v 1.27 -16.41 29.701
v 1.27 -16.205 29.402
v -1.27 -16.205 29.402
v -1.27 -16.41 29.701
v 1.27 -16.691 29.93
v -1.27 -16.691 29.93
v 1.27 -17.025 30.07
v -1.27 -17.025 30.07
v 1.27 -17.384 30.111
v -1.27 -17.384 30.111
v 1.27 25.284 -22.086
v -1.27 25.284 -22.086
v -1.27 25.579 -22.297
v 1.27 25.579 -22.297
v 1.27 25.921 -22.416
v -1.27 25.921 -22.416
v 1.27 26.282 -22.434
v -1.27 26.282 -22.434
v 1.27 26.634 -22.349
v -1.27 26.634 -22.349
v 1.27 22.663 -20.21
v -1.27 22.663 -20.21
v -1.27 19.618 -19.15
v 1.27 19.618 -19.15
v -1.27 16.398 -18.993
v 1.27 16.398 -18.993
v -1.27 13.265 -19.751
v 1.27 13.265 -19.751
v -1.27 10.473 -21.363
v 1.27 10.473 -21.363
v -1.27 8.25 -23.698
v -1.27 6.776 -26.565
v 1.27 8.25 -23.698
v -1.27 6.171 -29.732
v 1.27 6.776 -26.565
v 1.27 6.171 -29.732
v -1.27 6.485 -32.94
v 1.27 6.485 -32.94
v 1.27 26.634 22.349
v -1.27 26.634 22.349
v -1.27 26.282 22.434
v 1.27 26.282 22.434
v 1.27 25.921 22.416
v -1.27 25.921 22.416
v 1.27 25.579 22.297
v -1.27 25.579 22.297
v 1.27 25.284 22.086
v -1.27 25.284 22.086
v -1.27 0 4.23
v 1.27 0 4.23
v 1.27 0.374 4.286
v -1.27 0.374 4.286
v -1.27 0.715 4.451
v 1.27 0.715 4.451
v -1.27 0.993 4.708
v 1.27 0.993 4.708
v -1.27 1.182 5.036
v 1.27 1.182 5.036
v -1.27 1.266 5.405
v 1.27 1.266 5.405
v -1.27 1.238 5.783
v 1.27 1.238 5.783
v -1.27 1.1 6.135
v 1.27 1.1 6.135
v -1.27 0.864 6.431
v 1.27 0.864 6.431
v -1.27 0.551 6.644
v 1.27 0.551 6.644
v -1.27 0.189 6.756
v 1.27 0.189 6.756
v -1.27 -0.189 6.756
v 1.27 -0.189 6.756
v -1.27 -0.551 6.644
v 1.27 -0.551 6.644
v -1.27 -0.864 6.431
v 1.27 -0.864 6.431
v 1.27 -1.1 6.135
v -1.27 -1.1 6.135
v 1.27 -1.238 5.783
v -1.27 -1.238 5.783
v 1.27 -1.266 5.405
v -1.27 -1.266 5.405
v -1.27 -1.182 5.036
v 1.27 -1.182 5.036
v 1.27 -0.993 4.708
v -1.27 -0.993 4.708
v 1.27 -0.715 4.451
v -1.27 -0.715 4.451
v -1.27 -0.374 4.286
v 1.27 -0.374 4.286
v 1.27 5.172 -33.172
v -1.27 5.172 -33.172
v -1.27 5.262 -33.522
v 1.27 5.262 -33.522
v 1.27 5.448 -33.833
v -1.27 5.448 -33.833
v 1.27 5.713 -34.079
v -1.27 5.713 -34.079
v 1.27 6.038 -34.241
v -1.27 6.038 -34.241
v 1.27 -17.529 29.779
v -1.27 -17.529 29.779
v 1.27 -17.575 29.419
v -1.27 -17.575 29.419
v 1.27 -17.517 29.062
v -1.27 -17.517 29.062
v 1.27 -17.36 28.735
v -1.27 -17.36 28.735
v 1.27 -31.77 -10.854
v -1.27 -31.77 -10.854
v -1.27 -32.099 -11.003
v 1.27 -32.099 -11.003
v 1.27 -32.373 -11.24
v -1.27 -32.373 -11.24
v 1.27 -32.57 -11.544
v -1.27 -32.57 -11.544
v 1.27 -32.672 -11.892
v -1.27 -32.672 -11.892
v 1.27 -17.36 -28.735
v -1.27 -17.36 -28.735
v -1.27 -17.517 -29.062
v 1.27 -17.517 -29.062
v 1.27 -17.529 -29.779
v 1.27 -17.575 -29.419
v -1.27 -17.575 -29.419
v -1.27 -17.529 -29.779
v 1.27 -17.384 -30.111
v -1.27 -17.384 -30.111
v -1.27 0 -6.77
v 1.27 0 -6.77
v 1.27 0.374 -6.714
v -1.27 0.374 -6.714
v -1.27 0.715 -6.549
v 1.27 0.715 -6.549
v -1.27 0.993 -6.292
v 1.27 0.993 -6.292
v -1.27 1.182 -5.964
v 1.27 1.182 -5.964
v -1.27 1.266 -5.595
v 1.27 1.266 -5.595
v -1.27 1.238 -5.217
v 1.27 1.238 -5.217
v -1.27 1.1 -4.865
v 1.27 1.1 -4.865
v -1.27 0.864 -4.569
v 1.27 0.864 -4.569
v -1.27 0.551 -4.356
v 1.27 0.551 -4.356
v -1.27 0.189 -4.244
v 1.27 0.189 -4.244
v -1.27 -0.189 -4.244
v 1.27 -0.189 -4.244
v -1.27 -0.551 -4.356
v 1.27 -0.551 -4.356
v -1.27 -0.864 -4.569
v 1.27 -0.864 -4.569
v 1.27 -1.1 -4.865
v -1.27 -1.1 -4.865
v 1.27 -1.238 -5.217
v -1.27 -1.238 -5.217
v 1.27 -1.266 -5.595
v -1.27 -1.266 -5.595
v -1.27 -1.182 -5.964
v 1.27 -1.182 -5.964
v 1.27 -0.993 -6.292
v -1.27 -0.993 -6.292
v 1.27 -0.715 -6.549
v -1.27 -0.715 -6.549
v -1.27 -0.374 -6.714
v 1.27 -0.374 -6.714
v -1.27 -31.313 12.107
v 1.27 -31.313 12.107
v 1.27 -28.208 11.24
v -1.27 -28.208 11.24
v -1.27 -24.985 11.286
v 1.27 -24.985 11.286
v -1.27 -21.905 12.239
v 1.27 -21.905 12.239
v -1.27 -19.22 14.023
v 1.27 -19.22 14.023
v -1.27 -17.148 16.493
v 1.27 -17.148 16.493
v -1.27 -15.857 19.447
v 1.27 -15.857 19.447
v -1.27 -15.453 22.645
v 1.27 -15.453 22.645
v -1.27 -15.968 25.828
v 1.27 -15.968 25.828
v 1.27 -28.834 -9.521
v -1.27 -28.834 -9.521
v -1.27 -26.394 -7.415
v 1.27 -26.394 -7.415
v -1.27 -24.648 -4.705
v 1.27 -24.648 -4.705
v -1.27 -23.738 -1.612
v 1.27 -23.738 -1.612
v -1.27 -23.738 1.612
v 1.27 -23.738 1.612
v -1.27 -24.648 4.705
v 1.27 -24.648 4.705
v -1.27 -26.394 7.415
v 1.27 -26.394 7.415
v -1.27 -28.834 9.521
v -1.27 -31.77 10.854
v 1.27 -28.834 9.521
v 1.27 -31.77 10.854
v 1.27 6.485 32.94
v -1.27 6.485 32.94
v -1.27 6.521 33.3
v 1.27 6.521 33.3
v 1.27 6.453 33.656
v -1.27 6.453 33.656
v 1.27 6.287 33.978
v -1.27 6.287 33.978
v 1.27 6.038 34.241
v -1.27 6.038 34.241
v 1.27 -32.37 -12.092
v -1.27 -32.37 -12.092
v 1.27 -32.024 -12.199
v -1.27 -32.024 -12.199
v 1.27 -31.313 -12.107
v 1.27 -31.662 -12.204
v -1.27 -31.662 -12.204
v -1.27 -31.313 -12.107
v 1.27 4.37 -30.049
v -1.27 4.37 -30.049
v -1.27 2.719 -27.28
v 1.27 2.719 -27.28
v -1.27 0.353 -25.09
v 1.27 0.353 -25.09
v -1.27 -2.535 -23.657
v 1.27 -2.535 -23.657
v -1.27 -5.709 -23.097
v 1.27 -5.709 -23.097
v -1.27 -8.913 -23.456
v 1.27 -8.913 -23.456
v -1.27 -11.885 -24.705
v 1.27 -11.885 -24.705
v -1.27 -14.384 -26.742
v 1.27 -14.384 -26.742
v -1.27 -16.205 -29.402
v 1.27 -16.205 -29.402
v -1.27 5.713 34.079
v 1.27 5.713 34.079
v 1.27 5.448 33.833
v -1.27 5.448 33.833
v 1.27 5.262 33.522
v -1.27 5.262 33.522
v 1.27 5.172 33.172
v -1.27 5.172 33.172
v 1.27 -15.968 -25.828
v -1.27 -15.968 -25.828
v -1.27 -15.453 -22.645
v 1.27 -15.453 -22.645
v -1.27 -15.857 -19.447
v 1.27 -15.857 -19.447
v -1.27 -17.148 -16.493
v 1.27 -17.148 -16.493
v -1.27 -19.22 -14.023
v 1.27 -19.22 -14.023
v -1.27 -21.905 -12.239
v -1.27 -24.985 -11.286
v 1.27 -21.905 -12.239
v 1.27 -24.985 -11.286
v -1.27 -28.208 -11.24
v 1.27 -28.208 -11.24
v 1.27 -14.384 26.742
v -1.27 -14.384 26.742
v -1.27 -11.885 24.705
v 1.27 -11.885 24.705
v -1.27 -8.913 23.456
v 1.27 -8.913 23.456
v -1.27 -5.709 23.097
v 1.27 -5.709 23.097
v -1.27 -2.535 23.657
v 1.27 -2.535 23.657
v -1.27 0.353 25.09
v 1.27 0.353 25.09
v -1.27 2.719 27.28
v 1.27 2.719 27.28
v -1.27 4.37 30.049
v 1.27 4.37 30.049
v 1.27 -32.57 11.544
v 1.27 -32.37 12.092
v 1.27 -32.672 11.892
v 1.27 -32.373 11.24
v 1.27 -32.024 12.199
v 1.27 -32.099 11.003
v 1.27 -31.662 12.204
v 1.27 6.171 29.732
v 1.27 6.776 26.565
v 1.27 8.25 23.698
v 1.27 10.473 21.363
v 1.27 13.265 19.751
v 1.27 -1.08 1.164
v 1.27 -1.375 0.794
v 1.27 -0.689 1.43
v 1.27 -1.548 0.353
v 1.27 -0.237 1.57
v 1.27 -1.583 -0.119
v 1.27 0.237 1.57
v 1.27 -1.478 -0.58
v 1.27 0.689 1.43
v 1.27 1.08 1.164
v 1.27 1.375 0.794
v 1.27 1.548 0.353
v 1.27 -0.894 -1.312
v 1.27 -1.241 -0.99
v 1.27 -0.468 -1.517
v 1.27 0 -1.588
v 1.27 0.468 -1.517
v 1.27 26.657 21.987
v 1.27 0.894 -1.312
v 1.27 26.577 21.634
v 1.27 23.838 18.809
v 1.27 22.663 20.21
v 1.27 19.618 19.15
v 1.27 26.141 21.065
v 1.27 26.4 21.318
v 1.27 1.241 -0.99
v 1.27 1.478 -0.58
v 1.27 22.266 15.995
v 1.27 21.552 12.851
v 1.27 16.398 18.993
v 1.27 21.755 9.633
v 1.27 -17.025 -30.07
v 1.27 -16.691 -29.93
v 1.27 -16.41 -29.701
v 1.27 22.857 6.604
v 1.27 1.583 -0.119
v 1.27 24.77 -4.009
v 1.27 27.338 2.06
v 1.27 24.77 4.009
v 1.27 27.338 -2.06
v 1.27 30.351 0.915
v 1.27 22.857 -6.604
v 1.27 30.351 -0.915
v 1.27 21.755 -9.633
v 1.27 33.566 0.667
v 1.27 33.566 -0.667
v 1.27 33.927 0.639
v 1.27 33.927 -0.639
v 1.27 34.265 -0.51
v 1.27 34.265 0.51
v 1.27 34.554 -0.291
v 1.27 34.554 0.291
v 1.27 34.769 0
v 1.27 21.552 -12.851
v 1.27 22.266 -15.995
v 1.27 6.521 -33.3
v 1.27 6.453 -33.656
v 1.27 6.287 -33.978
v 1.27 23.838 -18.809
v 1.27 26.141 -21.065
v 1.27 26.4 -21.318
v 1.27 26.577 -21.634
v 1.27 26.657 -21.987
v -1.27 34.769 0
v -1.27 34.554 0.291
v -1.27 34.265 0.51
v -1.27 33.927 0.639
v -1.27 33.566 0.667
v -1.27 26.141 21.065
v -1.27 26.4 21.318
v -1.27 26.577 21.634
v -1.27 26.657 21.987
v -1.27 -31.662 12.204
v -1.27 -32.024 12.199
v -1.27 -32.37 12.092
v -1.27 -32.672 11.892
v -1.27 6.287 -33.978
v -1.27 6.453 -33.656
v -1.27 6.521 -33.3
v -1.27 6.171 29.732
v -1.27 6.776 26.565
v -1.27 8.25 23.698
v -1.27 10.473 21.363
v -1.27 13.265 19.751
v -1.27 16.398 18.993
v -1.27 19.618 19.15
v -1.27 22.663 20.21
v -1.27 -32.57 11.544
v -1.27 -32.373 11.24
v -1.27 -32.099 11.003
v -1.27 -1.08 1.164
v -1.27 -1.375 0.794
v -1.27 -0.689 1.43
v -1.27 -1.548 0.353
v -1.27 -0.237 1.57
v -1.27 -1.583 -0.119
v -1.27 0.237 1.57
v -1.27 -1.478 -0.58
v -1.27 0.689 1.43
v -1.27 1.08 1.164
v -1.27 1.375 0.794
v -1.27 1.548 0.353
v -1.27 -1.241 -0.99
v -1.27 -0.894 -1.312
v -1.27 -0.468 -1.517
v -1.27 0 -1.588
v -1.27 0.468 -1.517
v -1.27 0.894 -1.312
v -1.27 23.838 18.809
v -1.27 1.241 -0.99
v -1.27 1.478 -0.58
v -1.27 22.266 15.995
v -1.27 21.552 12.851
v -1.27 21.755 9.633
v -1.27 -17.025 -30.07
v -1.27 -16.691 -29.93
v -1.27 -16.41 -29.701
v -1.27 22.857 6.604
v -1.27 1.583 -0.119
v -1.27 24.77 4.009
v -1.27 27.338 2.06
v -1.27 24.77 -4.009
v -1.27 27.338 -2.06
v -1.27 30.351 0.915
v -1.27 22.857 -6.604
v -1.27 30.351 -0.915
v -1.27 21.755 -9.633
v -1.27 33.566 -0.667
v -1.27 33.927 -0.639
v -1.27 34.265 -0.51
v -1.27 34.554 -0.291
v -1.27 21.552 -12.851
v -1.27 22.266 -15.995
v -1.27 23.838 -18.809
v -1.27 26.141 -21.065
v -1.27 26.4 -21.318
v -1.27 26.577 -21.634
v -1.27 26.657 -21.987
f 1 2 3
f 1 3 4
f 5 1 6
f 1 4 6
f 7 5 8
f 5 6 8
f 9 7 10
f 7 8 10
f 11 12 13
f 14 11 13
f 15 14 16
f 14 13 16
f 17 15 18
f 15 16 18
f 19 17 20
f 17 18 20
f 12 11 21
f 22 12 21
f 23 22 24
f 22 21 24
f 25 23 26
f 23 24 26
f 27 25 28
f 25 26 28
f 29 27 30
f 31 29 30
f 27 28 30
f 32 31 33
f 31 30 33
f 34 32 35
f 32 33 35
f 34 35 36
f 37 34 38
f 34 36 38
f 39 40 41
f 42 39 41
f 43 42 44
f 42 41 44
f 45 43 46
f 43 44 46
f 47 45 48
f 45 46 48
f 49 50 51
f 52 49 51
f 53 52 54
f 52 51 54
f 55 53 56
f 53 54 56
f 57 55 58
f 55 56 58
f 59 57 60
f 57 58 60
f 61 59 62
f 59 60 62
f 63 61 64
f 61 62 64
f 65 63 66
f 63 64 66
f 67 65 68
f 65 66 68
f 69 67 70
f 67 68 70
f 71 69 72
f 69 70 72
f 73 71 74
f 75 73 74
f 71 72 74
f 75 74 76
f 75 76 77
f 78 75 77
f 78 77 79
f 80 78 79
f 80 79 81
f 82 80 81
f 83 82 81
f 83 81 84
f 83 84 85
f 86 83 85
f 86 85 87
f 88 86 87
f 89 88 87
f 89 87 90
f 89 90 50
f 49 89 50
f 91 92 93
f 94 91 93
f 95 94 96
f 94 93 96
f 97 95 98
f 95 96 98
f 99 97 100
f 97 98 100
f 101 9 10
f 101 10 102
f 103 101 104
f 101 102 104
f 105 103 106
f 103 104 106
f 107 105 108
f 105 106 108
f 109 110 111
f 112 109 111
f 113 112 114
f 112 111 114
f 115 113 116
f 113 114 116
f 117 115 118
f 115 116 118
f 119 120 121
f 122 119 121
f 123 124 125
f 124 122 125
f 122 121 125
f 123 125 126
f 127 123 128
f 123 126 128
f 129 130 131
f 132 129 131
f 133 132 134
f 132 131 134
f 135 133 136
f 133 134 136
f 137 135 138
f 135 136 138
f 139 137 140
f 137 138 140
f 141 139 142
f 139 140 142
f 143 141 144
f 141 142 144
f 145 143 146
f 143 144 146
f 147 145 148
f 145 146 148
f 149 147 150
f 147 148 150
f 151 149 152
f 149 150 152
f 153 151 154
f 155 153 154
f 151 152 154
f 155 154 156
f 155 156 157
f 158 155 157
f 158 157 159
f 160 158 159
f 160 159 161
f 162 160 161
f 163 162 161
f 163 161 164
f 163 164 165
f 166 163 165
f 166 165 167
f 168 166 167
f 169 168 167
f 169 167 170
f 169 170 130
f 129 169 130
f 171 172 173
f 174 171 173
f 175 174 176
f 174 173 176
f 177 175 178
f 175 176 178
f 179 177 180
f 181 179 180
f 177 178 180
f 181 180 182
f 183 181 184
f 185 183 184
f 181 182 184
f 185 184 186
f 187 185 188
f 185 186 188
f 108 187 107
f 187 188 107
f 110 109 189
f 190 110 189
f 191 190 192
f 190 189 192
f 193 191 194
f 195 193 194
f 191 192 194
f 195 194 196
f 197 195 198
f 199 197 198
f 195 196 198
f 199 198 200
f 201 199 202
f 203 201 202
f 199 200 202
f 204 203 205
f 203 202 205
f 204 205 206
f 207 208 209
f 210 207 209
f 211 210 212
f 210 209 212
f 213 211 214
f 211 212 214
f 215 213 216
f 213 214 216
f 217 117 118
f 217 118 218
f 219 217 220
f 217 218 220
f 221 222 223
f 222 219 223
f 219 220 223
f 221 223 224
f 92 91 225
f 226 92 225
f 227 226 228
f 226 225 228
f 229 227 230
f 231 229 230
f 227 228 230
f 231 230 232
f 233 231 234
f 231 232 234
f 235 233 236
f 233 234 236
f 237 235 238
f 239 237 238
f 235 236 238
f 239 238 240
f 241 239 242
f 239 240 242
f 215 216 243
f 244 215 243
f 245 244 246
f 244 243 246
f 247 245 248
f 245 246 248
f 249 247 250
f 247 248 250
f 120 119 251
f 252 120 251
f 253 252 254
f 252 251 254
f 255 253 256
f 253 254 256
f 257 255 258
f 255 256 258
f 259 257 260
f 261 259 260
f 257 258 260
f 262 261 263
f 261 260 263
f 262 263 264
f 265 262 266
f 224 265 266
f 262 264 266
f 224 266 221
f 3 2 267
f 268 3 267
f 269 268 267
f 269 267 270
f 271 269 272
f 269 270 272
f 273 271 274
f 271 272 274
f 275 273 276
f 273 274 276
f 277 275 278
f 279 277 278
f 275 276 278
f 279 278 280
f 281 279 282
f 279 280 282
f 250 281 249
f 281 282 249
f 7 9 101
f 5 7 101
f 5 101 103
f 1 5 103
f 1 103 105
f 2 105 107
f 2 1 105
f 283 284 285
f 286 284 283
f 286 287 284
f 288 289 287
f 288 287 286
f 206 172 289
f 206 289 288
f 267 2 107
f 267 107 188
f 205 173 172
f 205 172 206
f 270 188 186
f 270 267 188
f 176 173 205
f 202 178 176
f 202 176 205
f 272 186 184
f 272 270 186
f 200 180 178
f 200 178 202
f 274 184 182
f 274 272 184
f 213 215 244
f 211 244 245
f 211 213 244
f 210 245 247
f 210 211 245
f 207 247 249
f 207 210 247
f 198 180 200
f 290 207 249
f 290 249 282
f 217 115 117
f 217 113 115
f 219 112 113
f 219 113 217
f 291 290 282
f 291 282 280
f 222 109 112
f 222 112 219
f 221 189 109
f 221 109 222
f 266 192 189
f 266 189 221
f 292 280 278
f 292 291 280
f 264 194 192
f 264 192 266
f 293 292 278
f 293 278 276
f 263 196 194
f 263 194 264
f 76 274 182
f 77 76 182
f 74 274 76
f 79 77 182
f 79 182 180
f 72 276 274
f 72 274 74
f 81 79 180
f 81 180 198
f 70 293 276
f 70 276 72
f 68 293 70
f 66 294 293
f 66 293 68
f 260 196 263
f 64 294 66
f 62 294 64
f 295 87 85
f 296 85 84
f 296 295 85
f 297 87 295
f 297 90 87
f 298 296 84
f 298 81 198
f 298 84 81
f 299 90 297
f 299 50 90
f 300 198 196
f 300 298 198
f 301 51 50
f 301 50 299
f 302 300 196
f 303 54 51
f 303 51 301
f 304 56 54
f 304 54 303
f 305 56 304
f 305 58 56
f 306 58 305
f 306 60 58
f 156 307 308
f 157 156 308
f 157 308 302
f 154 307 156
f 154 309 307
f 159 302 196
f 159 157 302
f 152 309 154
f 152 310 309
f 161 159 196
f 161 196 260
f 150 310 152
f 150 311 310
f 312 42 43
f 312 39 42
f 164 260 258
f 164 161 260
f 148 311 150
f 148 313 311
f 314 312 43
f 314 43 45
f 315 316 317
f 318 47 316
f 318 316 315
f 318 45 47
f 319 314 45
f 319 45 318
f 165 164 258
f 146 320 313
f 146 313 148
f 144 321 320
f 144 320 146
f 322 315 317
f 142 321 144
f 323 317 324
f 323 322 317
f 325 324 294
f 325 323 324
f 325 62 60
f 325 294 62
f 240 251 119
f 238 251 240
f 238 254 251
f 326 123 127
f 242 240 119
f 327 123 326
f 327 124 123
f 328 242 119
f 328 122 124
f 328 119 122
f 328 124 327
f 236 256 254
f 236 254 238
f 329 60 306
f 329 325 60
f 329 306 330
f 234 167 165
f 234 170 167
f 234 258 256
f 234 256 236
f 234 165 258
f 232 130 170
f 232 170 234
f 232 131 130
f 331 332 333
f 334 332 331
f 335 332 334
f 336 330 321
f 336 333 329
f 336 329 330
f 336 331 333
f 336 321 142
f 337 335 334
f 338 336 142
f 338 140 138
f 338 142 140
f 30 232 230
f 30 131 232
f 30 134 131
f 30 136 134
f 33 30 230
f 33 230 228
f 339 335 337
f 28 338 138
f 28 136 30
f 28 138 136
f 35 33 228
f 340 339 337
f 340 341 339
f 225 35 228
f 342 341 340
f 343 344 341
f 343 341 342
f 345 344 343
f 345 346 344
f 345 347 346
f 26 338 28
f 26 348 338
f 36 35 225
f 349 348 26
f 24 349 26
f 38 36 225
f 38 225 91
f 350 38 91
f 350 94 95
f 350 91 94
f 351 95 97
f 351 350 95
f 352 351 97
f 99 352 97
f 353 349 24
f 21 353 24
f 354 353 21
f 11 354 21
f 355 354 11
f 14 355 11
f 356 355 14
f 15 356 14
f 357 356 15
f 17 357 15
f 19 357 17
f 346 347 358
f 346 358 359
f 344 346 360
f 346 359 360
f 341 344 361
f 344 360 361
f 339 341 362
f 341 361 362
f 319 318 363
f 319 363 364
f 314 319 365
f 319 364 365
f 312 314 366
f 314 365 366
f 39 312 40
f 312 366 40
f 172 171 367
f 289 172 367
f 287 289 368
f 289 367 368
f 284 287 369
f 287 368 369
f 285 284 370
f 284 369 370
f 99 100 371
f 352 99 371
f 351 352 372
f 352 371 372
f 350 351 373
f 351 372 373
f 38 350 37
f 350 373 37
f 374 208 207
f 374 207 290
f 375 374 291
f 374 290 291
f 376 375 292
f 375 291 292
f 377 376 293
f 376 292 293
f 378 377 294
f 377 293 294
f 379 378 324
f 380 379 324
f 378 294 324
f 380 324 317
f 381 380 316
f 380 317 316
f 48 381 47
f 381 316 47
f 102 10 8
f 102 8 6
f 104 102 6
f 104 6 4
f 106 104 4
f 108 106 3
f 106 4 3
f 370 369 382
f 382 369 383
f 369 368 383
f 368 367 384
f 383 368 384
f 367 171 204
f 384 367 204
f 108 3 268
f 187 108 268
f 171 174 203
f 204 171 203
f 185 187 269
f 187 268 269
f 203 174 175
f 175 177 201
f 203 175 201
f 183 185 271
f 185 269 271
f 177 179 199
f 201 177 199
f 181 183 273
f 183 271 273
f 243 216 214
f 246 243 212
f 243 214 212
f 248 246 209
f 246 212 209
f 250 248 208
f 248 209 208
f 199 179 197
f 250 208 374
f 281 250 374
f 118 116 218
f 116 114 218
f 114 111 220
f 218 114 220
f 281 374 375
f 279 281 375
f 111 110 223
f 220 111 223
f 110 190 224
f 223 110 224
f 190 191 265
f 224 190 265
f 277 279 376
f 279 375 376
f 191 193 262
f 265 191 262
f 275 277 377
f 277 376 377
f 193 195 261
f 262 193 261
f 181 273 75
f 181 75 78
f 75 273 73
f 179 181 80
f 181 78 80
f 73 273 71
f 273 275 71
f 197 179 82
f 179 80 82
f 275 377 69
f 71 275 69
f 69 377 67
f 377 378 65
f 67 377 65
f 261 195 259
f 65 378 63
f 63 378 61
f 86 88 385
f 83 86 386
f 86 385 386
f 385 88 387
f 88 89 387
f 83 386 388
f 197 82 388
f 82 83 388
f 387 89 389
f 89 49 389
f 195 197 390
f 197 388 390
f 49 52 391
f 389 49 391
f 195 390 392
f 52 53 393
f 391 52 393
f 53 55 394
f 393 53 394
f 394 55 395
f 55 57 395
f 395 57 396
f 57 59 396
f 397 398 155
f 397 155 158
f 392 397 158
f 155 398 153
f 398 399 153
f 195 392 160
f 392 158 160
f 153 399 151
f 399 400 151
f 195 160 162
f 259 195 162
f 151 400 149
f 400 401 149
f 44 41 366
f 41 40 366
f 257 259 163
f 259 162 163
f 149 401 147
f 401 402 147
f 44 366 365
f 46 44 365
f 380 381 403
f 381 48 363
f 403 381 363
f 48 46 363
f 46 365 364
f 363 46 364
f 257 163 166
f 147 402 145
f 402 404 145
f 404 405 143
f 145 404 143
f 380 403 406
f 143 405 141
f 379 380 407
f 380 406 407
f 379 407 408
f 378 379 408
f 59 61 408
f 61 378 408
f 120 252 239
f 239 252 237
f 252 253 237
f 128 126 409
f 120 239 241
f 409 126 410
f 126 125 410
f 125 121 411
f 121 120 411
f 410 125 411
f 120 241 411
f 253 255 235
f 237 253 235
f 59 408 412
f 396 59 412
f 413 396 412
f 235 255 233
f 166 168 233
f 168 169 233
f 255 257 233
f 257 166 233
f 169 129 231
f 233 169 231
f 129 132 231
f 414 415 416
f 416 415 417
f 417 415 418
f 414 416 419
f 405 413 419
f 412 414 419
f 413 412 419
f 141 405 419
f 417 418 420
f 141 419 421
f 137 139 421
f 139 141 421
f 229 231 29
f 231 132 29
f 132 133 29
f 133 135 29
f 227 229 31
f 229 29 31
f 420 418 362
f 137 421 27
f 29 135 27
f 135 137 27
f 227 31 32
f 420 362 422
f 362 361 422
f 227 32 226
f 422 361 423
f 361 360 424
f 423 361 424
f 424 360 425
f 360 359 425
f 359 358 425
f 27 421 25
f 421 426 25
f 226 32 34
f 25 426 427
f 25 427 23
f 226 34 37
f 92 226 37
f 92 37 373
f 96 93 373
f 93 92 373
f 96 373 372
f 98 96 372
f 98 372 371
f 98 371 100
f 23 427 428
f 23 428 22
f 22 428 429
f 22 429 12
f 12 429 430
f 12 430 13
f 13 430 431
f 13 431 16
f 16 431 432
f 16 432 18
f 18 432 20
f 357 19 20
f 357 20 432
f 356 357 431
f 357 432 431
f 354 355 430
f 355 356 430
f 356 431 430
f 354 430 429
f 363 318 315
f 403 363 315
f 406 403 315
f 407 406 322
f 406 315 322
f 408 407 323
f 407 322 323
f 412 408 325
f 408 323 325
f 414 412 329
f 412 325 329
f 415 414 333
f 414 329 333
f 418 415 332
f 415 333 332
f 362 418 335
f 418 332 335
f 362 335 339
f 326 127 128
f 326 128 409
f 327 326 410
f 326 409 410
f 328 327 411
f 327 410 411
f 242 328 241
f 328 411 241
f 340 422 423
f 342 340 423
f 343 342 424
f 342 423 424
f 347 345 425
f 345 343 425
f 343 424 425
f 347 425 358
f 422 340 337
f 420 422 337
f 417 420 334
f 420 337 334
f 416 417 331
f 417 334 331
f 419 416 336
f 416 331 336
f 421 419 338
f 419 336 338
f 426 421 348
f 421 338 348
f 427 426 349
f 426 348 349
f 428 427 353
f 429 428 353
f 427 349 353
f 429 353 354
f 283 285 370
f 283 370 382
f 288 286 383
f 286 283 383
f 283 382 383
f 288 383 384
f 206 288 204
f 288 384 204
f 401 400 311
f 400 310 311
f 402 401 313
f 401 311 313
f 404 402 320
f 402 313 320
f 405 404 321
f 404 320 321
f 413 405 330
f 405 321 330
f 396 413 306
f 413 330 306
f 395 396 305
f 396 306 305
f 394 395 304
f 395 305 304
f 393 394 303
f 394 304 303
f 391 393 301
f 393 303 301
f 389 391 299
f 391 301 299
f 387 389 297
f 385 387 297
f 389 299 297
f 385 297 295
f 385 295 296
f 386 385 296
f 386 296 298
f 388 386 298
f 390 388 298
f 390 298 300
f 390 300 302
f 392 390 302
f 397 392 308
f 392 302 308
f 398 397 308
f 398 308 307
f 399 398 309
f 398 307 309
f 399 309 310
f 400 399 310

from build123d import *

# Parameters (mm, degrees)
SKETCH1_R           = 34.925
BOSS_EXTRUDE1_DEPTH = 1.27
SKETCH3_R           = 11.303
CUT_EXTRUDE1_DEPTH  = 6.35
CIRPATTERN1_COUNT   = 9
FILLET1_R           = 1.27
SKETCH5_R           = 1.5875
CUT_EXTRUDE2_DEPTH  = 6.35
SKETCH6_R           = 1.27
CUT_EXTRUDE3_DEPTH  = 49.864387552


with BuildPart() as part:
    # Sketch1 → Boss-Extrude1 (new, symmetric)
    with BuildSketch(Plane(origin=(0, 0, 0), x_dir=(0, 0, -1), z_dir=(1, 0, 0))):
        Circle(SKETCH1_R)
    extrude(amount=BOSS_EXTRUDE1_DEPTH, both=True)

    # Sketch3 → Cut-Extrude1 (cut, symmetric)
    with BuildSketch(Plane(origin=(0, 0, 0), x_dir=(0, 0, -1), z_dir=(1, 0, 0))):
        with Locations((0, -34.925)):
            Circle(SKETCH3_R)
    cut_extrude1 = extrude(amount=CUT_EXTRUDE1_DEPTH, both=True, mode=Mode.SUBTRACT)

    # CirPattern1: Cut-Extrude1 ×9 about axis
    cirpattern1_axis = Axis((0, 0, 0), (1, 0, 0))
    for i in range(1, CIRPATTERN1_COUNT):
        add(cut_extrude1.rotate(cirpattern1_axis, i * 360 / CIRPATTERN1_COUNT), mode=Mode.SUBTRACT)

    # Fillet1
    # the kernel refuses this fillet: 1.27 mm, written as the material it takes off along each edge
    with BuildSketch(Plane(origin=(-4.923134512, -16.731633019, -30.656289429), x_dir=(0, 0.38689872135285164, 0.9221222150103143), z_dir=(1, 0, 0)), Plane(origin=(-4.923134512, 27.285133925, -21.800850711), x_dir=(0, -0.8409288486623601, 0.541145702641532), z_dir=(1, 0, 0)), Plane(origin=(-4.923134512, 34.91494194, 0.838125473), x_dir=(0, -0.9920306242693342, -0.12599698612187168), z_dir=(1, 0, 0)), Plane(origin=(-4.923134512, 26.207660586, 23.084933434), x_dir=(0, -0.6789502455883892, -0.7341842847783286), z_dir=(1, 0, 0)), Plane(origin=(-4.923134512, 5.237523577, 34.53004448), x_dir=(0, -0.048181501305167504, -0.9988385970375695), z_dir=(1, 0, 0)), Plane(origin=(-4.923134512, -18.183308922, 29.818163955), x_dir=(0, 0.6051319029164822, -0.7961252288884437), z_dir=(1, 0, 0)), Plane(origin=(-4.923134512, -33.095969091, 11.154033124), x_dir=(0, 0.9752973644715361, -0.22089601819606364), z_dir=(1, 0, 0)), Plane(origin=(-4.923134512, -32.522657502, -12.729193769), x_dir=(0, 0.8891103499675269, 0.45769289439603716), z_dir=(1, 0, 0))) as fillet1_piece_1:
        with BuildLine():
            CenterArc((1.436473101, 1.267699411), FILLET1_R, 171.739357487, 94.811422393)
            ThreePointArc((0.179649711, 1.450168495), (0.082239687, 0.726023913), (0, 0))
            ThreePointArc((0, 0), (0.680032479, 0.020475246), (1.360064958, 0))
        make_face()
    extrude(amount=9.846269024, mode=Mode.SUBTRACT)
    with BuildSketch(Plane(origin=(-4.923134512, 5.237523577, -34.53004448), x_dir=(0, 0.9853377060596639, 0.1706153715732537), z_dir=(1, 0, 0)), Plane(origin=(-4.923134512, 34.91494194, -0.838125473), x_dir=(0, 0.0030787563353731583, 0.999995260618483), z_dir=(1, 0, 0)), Plane(origin=(-4.923134512, 27.285133925, 21.800850711), x_dir=(0, -0.6404260990883884, 0.7680197989677282), z_dir=(1, 0, 0)), Plane(origin=(-4.923134512, 6.888308505, 34.238966558), x_dir=(0, -0.984268465205427, 0.17667933779067993), z_dir=(1, 0, 0)), Plane(origin=(-4.923134512, -16.731633019, 30.656289429), x_dir=(0, -0.8675606775273359, -0.497331349110741), z_dir=(1, 0, 0)), Plane(origin=(-4.923134512, -32.522657502, 12.729193769), x_dir=(0, -0.34491160697127204, -0.9386351705409801), z_dir=(1, 0, 0)), Plane(origin=(-4.923134512, -18.183308922, -29.818163955), x_dir=(0, 0.8644819211919598, -0.5026639115077373), z_dir=(1, 0, 0))) as fillet1_piece_2:
        with BuildLine():
            CenterArc((1.434685554, 1.269722067), FILLET1_R, 176.387286037, 94.811422393)
            ThreePointArc((0.167209335, 1.349747283), (0.103924585, 0.67235637), (0, 0))
            ThreePointArc((0, 0), (0.730626902, -0.007643151), (1.461253805, 0))
        make_face()
    extrude(amount=9.846269024, mode=Mode.SUBTRACT)
    with BuildSketch(Plane(origin=(-4.923134512, 6.888308505, -34.238966558), x_dir=(0, -0.984268465205427, -0.1766793377906796), z_dir=(1, 0, 0))) as fillet1_piece_3:
        with BuildLine():
            CenterArc((1.434685554, -1.269722067), FILLET1_R, 88.80129157, 94.811422393)
            ThreePointArc((0.167209335, -1.349747283), (0.103924585, -0.67235637), (0, 0))
            ThreePointArc((0, 0), (0.730626902, 0.007643151), (1.461253805, 0))
        make_face()
    extrude(amount=9.846269024, mode=Mode.SUBTRACT)
    with BuildSketch(Plane(origin=(-4.923134512, 26.207660586, -23.084933434), x_dir=(0, -0.6789502455883865, 0.7341842847783312), z_dir=(1, 0, 0)), Plane(origin=(-4.923134512, -33.095969091, -11.154033124), x_dir=(0, 0.9752973644715363, 0.22089601819606305), z_dir=(1, 0, 0))) as fillet1_piece_4:
        with BuildLine():
            CenterArc((1.436473101, -1.267699411), FILLET1_R, 93.44922012, 94.811422393)
            ThreePointArc((0.179649711, -1.450168495), (0.082239687, -0.726023913), (0, 0))
            ThreePointArc((0, 0), (0.680032479, -0.020475246), (1.360064958, 0))
        make_face()
    extrude(amount=9.846269024, mode=Mode.SUBTRACT)

    # Sketch5 → Cut-Extrude2 (cut, symmetric)
    with BuildSketch(Plane(origin=(0, 0, 0), x_dir=(0, 0, -1), z_dir=(1, 0, 0))):
        Circle(SKETCH5_R)
    extrude(amount=CUT_EXTRUDE2_DEPTH, both=True, mode=Mode.SUBTRACT)

    # Sketch6 → Cut-Extrude3 (cut, through all)
    with BuildSketch(Plane(origin=(1.27, 0, 0), x_dir=(0, 0, -1), z_dir=(1, 0, 0))):
        with Locations((-5.5, 0)):
            Circle(SKETCH6_R)
        with Locations((5.5, 0)):
            Circle(SKETCH6_R)
    extrude(amount=-CUT_EXTRUDE3_DEPTH, mode=Mode.SUBTRACT)


solid = part.part
